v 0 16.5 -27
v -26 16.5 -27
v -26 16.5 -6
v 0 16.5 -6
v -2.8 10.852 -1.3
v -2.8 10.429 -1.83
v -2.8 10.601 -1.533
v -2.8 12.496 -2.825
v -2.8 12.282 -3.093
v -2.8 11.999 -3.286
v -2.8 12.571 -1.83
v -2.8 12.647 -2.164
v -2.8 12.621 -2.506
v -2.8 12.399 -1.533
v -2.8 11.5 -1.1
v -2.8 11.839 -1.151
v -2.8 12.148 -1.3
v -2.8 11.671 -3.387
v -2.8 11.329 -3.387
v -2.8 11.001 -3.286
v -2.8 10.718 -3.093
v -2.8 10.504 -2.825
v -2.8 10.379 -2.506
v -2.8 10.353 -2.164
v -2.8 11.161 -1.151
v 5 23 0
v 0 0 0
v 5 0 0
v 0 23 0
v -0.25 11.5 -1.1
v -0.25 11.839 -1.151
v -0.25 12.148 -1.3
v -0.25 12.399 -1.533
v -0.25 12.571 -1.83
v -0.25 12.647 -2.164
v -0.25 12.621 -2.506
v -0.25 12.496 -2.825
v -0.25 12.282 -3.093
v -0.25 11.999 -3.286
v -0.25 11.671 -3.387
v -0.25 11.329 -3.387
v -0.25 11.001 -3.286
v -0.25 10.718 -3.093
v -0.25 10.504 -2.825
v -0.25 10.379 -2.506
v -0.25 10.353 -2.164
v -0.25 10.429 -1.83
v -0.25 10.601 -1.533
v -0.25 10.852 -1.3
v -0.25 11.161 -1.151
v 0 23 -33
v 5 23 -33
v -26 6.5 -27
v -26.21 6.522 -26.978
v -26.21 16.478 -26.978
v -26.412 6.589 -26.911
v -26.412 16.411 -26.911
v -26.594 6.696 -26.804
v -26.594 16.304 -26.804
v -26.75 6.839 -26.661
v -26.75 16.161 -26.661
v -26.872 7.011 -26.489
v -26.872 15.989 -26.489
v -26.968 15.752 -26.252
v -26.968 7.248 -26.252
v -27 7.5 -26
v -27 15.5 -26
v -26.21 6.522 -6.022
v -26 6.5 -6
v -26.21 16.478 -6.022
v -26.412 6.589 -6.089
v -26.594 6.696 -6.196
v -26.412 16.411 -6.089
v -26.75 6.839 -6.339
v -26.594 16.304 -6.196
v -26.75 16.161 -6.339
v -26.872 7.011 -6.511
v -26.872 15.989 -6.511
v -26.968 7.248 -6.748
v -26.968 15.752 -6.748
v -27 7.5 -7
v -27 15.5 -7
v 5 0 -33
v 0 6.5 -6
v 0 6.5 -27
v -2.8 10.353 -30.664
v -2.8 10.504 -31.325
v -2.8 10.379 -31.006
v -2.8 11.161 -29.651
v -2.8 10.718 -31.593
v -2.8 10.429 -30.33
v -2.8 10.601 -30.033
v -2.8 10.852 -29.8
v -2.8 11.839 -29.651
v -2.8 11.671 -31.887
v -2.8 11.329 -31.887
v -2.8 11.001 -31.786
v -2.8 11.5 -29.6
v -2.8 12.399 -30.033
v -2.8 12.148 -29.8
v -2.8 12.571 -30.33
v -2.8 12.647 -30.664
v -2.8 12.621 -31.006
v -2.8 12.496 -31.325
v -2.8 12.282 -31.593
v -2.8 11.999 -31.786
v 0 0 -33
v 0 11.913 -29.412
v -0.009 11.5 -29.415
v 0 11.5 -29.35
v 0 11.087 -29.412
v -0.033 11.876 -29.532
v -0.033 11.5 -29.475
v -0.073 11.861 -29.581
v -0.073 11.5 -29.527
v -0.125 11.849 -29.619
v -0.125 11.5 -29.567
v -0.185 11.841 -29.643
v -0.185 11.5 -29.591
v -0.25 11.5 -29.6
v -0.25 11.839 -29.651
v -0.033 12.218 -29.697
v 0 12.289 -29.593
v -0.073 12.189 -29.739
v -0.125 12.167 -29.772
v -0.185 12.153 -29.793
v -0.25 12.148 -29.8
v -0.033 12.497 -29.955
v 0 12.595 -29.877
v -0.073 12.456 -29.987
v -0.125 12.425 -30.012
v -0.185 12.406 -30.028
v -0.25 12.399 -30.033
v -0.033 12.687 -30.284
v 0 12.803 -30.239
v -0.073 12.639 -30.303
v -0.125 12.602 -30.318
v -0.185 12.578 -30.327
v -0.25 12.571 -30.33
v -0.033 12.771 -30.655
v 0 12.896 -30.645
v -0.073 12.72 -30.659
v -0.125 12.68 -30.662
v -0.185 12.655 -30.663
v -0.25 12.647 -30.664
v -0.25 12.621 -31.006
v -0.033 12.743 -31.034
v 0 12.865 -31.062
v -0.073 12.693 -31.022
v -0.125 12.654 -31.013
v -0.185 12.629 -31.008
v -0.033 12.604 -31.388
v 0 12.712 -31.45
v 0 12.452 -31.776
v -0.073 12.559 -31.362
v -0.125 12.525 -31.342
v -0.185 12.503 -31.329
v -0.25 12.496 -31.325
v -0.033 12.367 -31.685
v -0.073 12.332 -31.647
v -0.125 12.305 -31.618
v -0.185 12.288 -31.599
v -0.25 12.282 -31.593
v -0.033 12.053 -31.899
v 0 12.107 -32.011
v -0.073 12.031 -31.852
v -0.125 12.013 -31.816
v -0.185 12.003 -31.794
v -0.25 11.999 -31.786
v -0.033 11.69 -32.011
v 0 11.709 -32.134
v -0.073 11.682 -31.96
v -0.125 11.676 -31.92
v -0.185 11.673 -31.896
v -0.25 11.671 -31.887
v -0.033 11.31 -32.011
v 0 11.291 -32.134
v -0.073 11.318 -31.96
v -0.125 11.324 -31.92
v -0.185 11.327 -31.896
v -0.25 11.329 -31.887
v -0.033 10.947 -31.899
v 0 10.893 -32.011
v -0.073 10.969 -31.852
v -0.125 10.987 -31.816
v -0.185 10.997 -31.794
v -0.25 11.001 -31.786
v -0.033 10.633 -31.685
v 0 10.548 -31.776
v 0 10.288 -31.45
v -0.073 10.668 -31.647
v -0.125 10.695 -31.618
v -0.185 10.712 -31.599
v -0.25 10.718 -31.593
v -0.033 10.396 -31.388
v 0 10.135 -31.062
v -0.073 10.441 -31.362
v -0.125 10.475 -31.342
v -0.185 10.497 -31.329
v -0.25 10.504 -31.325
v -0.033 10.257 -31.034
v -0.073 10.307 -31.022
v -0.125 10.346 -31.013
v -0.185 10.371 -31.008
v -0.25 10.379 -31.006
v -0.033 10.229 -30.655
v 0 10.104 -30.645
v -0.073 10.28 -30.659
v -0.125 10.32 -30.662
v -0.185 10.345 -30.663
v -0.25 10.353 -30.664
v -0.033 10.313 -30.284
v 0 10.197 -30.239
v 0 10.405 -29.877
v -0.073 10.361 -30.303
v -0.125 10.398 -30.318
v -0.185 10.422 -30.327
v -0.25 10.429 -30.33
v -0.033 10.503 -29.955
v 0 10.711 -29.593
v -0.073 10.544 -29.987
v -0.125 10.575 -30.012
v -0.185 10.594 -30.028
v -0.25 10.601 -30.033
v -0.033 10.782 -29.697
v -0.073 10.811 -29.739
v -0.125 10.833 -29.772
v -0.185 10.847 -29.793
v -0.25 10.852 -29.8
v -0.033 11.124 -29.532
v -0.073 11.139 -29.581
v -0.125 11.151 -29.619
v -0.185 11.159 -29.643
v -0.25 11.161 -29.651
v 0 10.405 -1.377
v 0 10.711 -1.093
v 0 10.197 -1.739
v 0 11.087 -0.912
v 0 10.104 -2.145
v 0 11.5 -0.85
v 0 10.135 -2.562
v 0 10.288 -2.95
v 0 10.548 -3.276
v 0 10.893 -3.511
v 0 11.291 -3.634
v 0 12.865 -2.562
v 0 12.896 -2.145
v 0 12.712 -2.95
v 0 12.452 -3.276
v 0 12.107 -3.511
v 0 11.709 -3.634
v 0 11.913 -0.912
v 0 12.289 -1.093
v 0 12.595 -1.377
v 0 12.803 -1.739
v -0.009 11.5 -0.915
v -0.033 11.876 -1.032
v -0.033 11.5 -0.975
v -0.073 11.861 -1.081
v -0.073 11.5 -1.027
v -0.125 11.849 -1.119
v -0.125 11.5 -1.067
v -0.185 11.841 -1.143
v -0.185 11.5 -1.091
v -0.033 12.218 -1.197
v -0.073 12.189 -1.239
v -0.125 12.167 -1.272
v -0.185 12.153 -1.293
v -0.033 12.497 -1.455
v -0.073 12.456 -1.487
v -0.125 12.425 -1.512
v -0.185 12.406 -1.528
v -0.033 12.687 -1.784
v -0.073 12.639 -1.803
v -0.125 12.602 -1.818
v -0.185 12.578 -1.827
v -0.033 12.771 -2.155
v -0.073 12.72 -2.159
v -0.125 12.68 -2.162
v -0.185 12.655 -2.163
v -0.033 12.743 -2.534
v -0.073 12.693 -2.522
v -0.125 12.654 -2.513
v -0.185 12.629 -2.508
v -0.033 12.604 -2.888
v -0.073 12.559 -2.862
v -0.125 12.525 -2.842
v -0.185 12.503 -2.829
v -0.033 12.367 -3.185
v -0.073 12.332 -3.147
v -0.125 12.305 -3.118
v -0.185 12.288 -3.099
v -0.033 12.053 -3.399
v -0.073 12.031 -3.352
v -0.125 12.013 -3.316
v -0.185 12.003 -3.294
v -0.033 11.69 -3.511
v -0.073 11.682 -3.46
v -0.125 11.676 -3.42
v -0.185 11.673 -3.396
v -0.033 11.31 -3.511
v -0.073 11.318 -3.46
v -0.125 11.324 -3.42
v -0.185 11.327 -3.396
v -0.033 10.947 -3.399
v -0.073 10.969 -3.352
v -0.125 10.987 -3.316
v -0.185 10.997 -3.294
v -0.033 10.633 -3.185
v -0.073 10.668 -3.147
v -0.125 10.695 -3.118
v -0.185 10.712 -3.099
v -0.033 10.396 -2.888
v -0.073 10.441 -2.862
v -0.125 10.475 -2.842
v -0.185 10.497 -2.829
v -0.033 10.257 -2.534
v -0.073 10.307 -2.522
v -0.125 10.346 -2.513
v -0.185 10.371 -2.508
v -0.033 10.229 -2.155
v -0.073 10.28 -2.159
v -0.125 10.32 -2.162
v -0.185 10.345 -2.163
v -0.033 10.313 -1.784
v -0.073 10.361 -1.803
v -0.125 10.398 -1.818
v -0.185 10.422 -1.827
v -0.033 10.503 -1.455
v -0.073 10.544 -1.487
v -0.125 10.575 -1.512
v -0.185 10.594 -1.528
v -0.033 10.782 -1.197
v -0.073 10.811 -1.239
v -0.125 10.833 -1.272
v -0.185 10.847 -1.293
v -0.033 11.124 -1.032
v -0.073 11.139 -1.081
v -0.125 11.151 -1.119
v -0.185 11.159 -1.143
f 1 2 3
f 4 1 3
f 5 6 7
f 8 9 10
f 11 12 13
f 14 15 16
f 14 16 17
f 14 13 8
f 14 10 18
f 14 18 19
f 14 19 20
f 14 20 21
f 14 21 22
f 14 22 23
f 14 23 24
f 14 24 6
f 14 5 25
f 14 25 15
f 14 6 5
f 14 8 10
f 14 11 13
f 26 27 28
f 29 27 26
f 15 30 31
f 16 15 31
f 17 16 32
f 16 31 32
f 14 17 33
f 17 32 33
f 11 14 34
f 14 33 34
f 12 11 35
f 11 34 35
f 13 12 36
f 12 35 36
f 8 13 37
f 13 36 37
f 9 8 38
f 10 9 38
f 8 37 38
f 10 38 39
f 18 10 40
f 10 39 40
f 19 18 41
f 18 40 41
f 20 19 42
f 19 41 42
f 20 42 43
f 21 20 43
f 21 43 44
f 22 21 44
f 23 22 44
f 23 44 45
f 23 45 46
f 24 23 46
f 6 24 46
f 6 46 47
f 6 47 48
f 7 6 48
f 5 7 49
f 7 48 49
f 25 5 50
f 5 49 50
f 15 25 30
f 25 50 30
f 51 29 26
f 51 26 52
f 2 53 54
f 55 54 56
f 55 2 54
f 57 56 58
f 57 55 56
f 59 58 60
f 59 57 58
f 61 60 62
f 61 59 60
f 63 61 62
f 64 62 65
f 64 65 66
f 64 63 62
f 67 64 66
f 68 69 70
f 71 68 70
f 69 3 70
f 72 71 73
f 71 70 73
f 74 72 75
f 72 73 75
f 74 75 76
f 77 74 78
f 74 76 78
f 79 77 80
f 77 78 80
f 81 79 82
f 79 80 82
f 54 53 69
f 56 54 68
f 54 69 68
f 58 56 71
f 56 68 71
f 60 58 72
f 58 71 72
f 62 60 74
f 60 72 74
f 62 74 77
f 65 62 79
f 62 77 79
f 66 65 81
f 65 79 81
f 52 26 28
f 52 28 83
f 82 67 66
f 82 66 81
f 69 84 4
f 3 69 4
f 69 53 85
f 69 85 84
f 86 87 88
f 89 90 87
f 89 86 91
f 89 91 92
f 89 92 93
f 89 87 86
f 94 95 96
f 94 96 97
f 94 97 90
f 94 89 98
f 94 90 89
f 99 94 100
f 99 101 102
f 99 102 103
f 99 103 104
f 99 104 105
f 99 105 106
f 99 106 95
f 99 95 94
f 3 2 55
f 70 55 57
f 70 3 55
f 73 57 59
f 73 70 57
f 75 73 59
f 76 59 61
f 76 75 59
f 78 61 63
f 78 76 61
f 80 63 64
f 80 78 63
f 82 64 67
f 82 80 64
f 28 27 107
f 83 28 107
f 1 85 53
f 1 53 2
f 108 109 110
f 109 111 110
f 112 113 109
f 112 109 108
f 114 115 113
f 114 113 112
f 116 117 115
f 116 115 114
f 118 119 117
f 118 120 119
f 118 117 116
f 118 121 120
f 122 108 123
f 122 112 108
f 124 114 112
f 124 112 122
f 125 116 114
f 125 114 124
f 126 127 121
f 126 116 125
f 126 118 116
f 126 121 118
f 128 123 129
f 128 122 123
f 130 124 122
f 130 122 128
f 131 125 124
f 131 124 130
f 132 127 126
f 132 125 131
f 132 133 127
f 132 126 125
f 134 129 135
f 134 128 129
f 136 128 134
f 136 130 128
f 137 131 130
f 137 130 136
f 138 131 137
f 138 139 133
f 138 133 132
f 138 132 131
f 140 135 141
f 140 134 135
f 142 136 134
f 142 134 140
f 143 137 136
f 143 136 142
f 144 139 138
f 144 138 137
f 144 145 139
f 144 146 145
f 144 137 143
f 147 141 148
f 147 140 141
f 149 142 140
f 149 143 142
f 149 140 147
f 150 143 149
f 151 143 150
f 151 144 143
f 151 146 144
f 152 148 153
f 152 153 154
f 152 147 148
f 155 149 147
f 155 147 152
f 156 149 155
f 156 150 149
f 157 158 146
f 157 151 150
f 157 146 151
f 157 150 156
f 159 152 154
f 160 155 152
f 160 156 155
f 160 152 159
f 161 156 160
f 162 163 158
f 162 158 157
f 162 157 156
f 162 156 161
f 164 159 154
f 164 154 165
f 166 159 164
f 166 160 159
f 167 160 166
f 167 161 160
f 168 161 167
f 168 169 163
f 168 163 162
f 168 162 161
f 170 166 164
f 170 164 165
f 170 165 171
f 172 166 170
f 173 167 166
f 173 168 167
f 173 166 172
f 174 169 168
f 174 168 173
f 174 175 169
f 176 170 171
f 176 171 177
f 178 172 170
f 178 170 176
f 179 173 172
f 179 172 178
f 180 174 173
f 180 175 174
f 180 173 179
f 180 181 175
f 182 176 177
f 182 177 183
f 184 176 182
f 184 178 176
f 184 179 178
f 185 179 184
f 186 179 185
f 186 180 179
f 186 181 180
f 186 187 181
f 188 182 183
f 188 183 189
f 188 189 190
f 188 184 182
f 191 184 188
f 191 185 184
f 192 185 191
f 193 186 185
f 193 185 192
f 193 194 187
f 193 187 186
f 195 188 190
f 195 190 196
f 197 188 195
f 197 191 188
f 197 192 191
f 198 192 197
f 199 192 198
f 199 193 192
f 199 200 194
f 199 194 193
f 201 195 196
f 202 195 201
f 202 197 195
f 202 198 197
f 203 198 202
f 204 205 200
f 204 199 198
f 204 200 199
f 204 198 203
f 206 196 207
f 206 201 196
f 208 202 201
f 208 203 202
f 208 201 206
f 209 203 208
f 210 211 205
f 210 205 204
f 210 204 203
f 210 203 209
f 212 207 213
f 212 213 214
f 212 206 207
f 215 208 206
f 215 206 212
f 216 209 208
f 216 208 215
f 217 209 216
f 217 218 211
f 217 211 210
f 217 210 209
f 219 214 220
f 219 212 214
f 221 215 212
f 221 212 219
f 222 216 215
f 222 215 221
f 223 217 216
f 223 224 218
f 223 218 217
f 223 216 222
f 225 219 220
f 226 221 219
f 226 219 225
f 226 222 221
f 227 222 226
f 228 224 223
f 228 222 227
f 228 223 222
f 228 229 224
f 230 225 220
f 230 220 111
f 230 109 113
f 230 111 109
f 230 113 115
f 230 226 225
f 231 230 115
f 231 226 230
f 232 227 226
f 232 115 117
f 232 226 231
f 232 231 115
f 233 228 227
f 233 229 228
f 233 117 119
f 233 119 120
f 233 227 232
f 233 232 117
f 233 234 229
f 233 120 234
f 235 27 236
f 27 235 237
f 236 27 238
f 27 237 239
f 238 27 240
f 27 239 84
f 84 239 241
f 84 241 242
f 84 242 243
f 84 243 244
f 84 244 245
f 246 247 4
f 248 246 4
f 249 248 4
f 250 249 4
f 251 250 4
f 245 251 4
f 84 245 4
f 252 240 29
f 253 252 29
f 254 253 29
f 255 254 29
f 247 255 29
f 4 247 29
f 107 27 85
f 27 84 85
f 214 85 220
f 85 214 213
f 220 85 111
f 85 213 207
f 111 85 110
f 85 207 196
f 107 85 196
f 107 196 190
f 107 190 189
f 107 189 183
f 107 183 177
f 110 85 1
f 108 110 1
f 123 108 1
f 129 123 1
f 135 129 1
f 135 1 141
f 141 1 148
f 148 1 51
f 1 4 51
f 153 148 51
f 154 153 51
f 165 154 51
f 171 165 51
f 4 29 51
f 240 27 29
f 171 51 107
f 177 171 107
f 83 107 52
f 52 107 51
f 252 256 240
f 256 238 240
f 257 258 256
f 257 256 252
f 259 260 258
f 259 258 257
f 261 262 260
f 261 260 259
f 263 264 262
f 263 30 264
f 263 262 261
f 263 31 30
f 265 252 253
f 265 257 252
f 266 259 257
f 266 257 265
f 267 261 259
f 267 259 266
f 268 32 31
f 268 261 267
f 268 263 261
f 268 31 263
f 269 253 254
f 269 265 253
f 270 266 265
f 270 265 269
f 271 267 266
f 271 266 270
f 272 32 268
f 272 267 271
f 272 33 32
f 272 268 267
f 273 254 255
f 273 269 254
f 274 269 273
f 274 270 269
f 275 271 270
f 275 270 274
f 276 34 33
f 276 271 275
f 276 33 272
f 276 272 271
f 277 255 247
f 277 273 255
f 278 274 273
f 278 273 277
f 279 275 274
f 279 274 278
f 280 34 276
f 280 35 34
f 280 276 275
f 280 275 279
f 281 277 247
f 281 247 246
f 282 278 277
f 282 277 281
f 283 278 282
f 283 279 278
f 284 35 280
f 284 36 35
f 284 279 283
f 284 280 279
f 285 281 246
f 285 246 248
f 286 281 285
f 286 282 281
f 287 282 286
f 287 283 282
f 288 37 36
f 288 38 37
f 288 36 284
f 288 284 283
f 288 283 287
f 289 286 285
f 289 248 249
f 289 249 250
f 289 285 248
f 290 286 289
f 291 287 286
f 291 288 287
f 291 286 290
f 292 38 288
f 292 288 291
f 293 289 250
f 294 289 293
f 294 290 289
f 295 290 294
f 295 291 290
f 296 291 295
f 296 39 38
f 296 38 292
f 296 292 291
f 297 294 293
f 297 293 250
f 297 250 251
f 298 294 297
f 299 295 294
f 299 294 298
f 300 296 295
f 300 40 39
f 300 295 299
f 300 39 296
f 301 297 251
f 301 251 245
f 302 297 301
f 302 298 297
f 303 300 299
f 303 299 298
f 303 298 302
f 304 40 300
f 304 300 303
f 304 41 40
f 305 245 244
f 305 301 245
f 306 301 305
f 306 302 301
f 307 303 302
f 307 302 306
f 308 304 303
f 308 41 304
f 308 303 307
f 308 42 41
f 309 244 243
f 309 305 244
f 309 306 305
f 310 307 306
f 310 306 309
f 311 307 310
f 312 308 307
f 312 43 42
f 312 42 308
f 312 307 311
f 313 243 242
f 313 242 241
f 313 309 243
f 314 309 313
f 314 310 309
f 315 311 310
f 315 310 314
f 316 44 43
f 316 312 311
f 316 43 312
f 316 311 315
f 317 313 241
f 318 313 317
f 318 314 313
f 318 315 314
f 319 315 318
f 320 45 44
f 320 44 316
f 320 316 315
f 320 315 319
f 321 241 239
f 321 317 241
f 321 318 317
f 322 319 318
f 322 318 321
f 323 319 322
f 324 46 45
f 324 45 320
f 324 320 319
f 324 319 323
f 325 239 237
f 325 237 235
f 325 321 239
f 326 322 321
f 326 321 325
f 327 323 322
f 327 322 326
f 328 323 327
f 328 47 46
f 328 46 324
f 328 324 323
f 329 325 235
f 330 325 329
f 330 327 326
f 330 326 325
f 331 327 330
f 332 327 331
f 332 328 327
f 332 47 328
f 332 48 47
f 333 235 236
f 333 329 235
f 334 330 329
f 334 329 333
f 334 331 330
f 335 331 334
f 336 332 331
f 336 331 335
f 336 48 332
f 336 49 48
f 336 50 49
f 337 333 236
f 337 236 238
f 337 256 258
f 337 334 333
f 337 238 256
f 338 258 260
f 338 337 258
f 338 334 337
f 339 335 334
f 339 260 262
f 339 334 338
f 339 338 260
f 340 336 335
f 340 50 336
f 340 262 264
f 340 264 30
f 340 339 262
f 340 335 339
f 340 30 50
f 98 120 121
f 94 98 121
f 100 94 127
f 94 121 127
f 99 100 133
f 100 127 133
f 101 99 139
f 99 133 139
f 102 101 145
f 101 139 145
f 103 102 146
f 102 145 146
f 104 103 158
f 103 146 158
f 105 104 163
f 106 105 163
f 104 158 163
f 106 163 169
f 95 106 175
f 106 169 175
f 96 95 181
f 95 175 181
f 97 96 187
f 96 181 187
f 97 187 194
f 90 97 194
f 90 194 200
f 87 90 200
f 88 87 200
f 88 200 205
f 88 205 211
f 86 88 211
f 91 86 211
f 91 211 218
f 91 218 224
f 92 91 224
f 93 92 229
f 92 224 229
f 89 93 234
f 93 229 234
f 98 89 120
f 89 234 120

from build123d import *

# Parameters (mm, degrees)
SKETCH1_W           = 33
SKETCH1_H           = 23
BOSS_EXTRUDE1_DEPTH = 5
SKETCH2_W           = 21
SKETCH2_H           = 10
BOSS_EXTRUDE2_DEPTH = 27
FILLET1_R           = 1
SKETCH3_R           = 1.15
BOSS_EXTRUDE5_DEPTH = 2.8
FILLET9_R           = 0.25


with BuildPart() as part:
    # Sketch1 → Boss-Extrude1 (new body)
    with BuildSketch(Plane(origin=(0, 0, 0), x_dir=(0, 0, -1), z_dir=(1, 0, 0))):
        with Locations((16.5, 11.5)):
            Rectangle(SKETCH1_W, SKETCH1_H)
    extrude(amount=BOSS_EXTRUDE1_DEPTH)

    # Sketch2 → Boss-Extrude2 (add)
    with BuildSketch(Plane.ZY):
        with Locations((-16.5, 11.5)):
            Rectangle(SKETCH2_W, SKETCH2_H)
    extrude(amount=BOSS_EXTRUDE2_DEPTH)

    # Fillet1
    fillet1_edges = [part.edges().sort_by_distance(p)[0] for p in [
        (-27, 11.5, -27),
        (-27, 6.5, -16.5),
        (-27, 11.5, -6),
        (-27, 16.5, -16.5),
    ]]
    fillet(fillet1_edges, radius=FILLET1_R)

    # Sketch3 → Boss-Extrude5 (add)
    with BuildSketch(Plane.ZY):
        with Locations((-2.25, 11.5)):
            Circle(SKETCH3_R)
        with Locations((-30.75, 11.5)):
            Circle(SKETCH3_R)
    extrude(amount=BOSS_EXTRUDE5_DEPTH)

    # Fillet9
    fillet9_edges = [part.edges().sort_by_distance(p)[0] for p in [
        (0, 11.5, -3.4),
        (0, 11.5, -31.9),
    ]]
    fillet(fillet9_edges, radius=FILLET9_R)


solid = part.part
